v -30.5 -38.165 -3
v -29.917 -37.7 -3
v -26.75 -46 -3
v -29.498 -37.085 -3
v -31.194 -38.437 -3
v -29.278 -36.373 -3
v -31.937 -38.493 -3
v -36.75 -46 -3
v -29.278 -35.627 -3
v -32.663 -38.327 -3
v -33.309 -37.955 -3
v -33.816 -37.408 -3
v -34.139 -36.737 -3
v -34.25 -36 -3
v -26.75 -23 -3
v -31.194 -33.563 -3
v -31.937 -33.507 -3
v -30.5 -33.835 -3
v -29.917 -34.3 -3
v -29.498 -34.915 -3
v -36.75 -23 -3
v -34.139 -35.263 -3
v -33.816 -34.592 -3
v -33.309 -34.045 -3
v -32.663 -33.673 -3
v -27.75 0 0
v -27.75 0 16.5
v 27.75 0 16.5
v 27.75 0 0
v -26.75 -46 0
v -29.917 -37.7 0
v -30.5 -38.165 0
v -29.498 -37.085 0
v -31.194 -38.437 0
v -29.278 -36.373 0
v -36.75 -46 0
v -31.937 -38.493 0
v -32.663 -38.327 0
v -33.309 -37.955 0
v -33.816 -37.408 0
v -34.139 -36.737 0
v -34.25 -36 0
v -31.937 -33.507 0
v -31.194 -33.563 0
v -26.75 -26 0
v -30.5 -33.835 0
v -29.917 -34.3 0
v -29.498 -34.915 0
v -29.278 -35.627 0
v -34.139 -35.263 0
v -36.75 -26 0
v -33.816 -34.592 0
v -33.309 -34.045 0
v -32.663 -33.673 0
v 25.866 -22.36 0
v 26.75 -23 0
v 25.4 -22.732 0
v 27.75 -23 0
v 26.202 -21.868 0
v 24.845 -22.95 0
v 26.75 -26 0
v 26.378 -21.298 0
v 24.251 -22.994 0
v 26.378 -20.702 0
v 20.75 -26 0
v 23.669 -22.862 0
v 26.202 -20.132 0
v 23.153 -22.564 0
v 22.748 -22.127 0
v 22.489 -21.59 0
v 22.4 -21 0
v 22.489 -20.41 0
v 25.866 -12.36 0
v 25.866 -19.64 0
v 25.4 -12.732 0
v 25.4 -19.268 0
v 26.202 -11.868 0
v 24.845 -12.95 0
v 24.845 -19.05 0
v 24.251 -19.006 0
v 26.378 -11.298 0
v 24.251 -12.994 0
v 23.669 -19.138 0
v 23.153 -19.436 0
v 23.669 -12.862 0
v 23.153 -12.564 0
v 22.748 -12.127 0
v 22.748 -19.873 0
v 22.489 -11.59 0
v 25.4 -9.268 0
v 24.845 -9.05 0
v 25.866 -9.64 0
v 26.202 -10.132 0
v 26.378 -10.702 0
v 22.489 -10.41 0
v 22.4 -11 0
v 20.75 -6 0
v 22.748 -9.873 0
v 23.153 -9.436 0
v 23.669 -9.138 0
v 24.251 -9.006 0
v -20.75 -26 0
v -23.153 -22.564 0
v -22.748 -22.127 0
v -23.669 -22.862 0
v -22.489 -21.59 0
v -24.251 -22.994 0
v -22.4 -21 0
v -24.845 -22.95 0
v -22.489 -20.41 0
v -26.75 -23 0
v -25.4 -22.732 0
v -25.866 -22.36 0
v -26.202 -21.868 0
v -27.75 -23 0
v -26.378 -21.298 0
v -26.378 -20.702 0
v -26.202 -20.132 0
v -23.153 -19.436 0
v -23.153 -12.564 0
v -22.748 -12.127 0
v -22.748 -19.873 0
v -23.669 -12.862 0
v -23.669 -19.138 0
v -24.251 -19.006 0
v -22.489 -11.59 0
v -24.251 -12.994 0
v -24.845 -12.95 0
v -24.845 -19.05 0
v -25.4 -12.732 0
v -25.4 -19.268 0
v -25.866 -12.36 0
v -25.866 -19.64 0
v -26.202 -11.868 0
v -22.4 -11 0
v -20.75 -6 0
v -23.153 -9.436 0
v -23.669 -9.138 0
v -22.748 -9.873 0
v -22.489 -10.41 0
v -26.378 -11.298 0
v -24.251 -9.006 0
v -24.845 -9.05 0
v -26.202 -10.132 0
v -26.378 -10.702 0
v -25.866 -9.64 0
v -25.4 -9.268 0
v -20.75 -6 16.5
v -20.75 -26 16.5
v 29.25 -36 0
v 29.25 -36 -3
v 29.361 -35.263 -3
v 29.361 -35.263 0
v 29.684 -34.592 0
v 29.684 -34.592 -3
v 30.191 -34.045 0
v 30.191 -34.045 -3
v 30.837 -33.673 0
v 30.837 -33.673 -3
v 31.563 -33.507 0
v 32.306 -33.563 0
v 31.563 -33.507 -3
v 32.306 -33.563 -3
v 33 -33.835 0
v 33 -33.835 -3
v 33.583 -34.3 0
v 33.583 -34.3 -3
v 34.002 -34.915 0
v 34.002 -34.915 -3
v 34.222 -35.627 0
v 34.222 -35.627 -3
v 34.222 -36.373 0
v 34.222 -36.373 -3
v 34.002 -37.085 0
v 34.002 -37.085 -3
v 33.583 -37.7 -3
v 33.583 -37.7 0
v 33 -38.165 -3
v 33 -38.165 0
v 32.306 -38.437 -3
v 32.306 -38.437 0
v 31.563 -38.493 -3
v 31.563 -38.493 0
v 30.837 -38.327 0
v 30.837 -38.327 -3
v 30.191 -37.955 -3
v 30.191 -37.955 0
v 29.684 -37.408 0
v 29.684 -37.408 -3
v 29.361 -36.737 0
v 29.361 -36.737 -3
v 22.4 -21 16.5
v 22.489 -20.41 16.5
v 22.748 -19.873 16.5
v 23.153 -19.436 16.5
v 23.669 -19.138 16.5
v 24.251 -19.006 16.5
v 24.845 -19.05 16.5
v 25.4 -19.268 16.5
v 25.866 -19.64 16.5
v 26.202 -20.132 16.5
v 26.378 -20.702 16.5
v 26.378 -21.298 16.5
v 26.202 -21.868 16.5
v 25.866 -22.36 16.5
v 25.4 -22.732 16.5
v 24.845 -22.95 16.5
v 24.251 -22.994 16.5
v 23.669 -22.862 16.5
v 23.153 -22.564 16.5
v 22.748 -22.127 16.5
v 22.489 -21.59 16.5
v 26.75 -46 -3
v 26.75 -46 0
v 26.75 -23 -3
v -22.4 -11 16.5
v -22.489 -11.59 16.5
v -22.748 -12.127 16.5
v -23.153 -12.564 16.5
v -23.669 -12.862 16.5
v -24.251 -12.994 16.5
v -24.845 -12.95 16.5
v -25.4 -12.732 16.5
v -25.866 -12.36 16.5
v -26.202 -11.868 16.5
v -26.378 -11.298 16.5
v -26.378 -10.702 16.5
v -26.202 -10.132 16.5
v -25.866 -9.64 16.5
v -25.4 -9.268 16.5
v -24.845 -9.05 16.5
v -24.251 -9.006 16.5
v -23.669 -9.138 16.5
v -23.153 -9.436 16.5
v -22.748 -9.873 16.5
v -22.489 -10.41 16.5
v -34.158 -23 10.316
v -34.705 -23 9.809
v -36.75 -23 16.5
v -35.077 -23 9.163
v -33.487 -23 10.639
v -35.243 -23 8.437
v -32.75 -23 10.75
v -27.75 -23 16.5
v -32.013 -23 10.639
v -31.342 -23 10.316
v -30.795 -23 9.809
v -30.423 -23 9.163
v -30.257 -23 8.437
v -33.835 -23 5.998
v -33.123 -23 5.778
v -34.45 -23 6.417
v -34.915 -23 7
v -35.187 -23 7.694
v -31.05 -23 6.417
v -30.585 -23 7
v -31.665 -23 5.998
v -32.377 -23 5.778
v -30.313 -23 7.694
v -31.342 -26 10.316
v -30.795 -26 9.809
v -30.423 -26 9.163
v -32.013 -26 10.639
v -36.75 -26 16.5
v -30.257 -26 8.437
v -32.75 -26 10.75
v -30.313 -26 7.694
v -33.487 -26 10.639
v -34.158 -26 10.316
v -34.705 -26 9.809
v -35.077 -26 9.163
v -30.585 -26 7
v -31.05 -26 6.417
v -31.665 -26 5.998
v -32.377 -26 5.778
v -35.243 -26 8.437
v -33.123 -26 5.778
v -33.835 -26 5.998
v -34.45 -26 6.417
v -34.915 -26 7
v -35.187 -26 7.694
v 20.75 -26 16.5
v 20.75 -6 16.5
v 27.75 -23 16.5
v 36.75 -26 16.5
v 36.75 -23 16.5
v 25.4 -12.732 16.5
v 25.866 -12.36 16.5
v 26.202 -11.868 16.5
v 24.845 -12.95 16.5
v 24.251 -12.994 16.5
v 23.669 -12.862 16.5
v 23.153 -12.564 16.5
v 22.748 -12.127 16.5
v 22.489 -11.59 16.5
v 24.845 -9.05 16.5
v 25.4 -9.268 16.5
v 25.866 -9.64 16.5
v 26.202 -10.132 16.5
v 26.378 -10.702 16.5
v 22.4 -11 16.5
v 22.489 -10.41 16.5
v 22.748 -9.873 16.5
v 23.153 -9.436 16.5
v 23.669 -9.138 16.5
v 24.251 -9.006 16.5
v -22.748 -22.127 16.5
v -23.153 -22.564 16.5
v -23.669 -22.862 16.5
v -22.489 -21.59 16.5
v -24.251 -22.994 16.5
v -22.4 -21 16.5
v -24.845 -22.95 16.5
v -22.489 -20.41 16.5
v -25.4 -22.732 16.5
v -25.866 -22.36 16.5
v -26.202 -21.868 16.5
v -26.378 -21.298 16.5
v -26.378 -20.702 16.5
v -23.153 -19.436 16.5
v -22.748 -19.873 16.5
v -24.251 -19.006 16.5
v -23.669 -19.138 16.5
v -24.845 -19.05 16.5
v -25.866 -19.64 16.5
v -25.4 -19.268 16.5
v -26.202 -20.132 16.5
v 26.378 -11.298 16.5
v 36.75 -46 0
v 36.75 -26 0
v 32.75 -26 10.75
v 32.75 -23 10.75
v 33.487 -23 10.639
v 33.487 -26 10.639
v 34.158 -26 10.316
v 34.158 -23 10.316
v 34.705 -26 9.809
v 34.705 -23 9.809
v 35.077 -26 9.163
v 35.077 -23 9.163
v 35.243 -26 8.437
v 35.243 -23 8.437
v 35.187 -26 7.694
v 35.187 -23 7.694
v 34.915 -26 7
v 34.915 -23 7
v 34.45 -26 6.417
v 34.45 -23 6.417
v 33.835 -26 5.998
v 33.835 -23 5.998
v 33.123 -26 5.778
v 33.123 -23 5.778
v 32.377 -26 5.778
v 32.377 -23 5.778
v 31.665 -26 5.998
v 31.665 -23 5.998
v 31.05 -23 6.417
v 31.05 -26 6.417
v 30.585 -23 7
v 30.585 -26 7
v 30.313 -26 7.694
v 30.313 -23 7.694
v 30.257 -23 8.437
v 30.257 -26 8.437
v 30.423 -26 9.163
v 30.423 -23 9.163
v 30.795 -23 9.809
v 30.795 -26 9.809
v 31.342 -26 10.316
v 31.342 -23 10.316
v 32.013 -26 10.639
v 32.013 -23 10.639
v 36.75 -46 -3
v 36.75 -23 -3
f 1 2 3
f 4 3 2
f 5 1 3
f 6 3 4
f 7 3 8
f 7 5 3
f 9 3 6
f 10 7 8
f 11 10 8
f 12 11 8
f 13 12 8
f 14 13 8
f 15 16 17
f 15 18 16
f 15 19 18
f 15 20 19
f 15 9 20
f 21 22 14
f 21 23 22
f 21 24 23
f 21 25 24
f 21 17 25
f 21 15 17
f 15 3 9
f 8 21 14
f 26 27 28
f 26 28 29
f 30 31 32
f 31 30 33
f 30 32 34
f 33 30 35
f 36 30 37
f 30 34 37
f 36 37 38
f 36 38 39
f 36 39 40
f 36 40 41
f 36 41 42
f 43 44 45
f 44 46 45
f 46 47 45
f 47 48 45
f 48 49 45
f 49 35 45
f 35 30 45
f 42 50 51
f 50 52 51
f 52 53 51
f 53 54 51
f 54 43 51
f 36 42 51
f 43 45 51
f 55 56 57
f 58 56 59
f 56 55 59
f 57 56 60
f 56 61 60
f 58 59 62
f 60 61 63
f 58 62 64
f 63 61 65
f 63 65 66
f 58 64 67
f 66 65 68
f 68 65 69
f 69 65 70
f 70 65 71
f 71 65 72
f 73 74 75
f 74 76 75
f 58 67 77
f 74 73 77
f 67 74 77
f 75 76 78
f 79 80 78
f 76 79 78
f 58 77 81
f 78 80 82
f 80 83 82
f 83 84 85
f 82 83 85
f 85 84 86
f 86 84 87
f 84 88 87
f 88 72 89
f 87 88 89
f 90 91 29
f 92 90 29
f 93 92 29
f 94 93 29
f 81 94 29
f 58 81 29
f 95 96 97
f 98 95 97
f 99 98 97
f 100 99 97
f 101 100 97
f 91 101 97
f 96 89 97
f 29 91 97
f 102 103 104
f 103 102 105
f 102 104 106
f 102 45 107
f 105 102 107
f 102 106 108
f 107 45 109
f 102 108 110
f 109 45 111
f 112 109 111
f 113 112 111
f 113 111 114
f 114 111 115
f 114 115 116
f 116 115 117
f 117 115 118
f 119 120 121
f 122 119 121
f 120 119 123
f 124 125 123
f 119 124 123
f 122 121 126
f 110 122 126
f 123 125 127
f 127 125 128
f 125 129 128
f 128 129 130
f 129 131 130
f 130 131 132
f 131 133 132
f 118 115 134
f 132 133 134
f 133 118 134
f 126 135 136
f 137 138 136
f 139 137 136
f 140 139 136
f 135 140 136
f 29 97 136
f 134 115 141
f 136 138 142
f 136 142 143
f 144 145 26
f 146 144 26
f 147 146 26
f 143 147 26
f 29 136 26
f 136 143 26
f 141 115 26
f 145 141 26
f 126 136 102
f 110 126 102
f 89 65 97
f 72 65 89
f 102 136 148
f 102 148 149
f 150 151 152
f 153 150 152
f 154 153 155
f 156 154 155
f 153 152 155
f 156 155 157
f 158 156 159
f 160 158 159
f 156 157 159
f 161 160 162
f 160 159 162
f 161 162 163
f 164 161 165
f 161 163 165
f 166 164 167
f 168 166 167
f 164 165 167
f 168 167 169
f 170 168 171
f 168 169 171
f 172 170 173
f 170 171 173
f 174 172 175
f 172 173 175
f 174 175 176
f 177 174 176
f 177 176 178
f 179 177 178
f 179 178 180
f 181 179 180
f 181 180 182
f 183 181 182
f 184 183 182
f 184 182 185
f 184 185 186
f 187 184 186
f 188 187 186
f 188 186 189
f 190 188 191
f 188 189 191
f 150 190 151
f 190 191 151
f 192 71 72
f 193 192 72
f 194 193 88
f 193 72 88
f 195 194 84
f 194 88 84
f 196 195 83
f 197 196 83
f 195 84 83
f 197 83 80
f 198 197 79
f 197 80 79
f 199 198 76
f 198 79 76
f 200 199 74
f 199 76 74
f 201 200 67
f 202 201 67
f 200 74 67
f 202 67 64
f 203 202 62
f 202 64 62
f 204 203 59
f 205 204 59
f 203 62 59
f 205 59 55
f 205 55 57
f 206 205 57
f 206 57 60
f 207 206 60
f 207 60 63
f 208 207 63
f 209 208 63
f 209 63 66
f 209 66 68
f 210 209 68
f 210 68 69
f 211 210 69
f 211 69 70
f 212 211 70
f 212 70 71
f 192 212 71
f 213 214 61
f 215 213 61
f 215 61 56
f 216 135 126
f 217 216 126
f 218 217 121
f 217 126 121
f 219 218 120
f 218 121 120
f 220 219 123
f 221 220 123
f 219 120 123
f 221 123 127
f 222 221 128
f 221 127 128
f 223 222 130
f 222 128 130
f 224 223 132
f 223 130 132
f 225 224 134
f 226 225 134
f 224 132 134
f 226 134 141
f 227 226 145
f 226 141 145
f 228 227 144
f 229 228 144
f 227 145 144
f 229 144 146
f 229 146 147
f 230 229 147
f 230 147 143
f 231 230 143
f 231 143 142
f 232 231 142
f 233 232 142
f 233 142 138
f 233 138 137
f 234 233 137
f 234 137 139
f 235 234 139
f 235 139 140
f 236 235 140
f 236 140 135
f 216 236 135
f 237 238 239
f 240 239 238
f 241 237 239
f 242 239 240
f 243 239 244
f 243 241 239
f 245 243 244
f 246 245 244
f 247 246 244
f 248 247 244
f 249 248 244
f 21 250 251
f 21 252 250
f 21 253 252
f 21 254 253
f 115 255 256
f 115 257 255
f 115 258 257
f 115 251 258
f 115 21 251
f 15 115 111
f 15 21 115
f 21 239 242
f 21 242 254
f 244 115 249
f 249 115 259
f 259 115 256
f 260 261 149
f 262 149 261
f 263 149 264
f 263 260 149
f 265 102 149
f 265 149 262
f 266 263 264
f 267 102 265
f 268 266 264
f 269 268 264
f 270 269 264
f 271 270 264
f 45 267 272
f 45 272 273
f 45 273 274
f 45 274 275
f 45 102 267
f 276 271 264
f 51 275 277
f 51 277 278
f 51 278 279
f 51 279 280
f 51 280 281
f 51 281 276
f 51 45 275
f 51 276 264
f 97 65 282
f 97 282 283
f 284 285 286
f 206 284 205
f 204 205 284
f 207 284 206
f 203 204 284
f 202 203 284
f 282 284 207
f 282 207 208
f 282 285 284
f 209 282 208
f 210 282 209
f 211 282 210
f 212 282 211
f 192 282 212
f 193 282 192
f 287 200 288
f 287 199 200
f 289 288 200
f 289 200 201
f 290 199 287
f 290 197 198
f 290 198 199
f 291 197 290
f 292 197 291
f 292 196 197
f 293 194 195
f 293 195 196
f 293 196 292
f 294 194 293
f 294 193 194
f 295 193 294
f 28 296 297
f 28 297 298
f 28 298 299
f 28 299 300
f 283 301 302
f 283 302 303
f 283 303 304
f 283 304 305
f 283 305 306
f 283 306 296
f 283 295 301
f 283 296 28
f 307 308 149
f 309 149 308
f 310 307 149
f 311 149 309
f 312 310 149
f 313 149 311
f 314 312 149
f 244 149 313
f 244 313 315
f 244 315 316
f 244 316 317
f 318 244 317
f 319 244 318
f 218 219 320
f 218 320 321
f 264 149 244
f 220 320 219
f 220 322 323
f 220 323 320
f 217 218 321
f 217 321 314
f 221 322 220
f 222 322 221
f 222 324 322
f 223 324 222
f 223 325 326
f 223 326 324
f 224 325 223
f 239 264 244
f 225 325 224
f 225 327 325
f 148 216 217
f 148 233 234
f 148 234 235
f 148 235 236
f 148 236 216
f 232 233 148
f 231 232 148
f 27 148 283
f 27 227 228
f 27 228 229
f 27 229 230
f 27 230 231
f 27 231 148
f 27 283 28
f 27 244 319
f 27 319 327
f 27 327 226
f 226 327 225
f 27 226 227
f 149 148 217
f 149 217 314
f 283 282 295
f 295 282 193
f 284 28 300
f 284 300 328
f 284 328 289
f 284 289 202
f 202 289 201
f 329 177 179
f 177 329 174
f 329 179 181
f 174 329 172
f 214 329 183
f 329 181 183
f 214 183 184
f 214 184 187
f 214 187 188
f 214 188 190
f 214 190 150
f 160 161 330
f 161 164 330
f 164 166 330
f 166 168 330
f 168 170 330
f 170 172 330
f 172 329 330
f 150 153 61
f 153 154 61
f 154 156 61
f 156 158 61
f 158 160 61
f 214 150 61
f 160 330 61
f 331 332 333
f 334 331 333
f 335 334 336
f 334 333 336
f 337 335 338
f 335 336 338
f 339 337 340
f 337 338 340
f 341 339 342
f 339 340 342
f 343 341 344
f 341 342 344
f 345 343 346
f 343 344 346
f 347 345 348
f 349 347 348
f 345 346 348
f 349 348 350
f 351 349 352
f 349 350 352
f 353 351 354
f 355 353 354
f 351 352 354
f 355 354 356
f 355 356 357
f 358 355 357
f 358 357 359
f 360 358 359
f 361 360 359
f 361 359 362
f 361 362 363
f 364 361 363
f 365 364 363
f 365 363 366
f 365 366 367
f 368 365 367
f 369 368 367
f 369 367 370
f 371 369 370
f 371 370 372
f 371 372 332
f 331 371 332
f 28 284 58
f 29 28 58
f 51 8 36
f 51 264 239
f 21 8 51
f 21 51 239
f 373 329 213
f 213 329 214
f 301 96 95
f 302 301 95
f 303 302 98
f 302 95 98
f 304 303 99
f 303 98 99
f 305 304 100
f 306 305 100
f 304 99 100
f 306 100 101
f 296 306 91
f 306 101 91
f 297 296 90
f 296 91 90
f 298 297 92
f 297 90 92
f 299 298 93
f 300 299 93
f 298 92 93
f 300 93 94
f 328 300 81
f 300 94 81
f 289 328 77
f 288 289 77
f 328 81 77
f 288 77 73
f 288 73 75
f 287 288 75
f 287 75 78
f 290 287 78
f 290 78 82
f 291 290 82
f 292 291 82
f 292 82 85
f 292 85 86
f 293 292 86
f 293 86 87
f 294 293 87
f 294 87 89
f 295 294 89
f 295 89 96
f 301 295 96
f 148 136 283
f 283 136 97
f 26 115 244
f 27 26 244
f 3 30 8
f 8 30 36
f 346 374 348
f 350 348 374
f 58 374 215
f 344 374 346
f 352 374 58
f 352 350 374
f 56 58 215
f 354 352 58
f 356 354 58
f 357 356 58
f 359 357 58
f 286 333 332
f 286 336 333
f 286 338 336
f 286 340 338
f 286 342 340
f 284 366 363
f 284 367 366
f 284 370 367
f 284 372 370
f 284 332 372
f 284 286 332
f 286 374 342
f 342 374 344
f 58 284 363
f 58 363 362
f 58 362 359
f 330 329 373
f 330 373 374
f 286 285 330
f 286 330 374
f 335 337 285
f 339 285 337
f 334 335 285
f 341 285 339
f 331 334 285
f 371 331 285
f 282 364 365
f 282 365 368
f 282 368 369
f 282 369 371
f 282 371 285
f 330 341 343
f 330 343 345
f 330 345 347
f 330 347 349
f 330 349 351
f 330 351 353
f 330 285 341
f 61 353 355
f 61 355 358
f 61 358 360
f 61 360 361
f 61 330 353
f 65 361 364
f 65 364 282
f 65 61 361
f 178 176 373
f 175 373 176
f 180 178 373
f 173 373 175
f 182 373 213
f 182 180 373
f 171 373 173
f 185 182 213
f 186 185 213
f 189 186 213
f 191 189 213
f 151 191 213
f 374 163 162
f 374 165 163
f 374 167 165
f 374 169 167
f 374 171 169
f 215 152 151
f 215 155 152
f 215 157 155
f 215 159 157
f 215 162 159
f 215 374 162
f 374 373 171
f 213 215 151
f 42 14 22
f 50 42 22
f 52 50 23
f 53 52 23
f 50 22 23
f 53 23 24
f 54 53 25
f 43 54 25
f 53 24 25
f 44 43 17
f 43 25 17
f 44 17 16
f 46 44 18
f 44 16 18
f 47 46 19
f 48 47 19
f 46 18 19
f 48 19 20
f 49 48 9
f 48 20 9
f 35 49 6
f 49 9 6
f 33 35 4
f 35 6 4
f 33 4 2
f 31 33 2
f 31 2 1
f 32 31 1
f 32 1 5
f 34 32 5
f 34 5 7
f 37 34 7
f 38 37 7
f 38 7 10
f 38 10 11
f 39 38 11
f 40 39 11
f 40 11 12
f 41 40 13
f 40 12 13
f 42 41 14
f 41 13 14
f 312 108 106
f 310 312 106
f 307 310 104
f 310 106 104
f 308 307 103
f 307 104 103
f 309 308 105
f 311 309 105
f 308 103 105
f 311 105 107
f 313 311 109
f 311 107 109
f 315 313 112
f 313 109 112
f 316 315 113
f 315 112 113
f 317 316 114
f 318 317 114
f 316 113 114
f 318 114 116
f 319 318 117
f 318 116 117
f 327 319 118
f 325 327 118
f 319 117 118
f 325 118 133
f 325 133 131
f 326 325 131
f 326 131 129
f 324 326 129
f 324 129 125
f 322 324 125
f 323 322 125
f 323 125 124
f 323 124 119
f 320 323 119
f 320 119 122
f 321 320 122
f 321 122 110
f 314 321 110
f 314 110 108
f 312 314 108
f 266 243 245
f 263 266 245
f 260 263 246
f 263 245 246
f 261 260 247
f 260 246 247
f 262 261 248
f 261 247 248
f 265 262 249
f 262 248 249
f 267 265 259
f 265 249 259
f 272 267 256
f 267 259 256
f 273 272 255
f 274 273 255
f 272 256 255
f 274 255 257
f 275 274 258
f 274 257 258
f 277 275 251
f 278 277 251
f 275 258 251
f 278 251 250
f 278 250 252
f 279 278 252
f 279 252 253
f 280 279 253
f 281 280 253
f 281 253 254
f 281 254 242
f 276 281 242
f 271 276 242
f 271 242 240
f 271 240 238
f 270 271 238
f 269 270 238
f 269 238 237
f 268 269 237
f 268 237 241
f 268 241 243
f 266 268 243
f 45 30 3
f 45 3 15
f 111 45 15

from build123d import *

# Parameters (mm, degrees)
EXTRUDE_1_DEPTH     = 16.5
SKETCH_2_R          = 2.5
CUT_EXTRUDE_1_DEPTH = 16.5
SKETCH_3_W          = 10
SKETCH_3_H          = 16.5
CUT_EXTRUDE_2_DEPTH = 3
SKETCH_5_R          = 2
CUT_EXTRUDE_4_DEPTH = 48.945933091
SKETCH_6_W          = 10
SKETCH_6_H          = 23
EXTRUDE_2_DEPTH     = 3
SKETCH_7_R          = 2.5
CUT_EXTRUDE_5_DEPTH = 3
SKETCH2_W           = 16.5
SKETCH2_H           = 23
BOSS_EXTRUDE1_DEPTH = 1
SKETCH3_W           = 16.5
SKETCH3_H           = 23
BOSS_EXTRUDE2_DEPTH = 1


with BuildPart() as part:
    # 草图1 → 凸台-拉伸1 (new body)
    with BuildSketch(Plane.XY):
        Polygon((0, 0), (26.75, 0), (26.75, -20), (36.75, -20), (36.75, -26), (20.75, -26), (20.75, -6), (0, -6), (-20.75, -6), (-20.75, -26), (-36.75, -26), (-36.75, -20), (-26.75, -20), (-26.75, 0), align=None)
    extrude(amount=EXTRUDE_1_DEPTH)

    # 草图2 → 切除-拉伸1 (cut)
    with BuildSketch(Plane(origin=(0, -20, 0), x_dir=(1, 0, 0), z_dir=(0, 1, 0))):
        with Locations(Location((32.75, -8.25, 0), (0, 0, 270))):
            Circle(SKETCH_2_R)
        with Locations(Location((-32.75, -8.25, 0), (0, 0, 270))):
            Circle(SKETCH_2_R)
    extrude(amount=-CUT_EXTRUDE_1_DEPTH, mode=Mode.SUBTRACT)

    # 草图3 → 切除-拉伸2 (cut)
    with BuildSketch(Plane(origin=(0, -20, 0), x_dir=(1, 0, 0), z_dir=(0, 1, 0))):
        with Locations((31.75, -8.25)):
            Rectangle(SKETCH_3_W, SKETCH_3_H)
        with Locations((-31.75, -8.25)):
            Rectangle(SKETCH_3_W, SKETCH_3_H)
    extrude(amount=-CUT_EXTRUDE_2_DEPTH, mode=Mode.SUBTRACT)

    # 草图5 → 切除-拉伸4 (cut, through all)
    with BuildSketch(Plane(origin=(0, 0, 0), x_dir=(-1, 0, 0), z_dir=(0, 0, -1))):
        with Locations((-24.4, -11)):
            Circle(SKETCH_5_R)
        with Locations((-24.4, -21)):
            Circle(SKETCH_5_R)
        with Locations(Location((24.4, -21, 0), (0, 0, 180))):
            Circle(SKETCH_5_R)
        with Locations(Location((24.4, -11, 0), (0, 0, 180))):
            Circle(SKETCH_5_R)
    extrude(amount=-CUT_EXTRUDE_4_DEPTH, mode=Mode.SUBTRACT)

    # 草图6 → 凸台-拉伸2 (add)
    with BuildSketch(Plane(origin=(0, 0, 0), x_dir=(-1, 0, 0), z_dir=(0, 0, -1))):
        with Locations((-31.75, -34.5)):
            Rectangle(SKETCH_6_W, SKETCH_6_H)
        with Locations((31.75, -34.5)):
            Rectangle(SKETCH_6_W, SKETCH_6_H)
    extrude(amount=EXTRUDE_2_DEPTH)

    # 草图7 → 切除-拉伸5 (cut)
    with BuildSketch(Plane(origin=(0, 0, -3), x_dir=(-1, 0, 0), z_dir=(0, 0, -1))):
        with Locations((-31.75, -36)):
            Circle(SKETCH_7_R)
        with Locations((31.75, -36)):
            Circle(SKETCH_7_R)
    extrude(amount=-CUT_EXTRUDE_5_DEPTH, mode=Mode.SUBTRACT)

    # Sketch2 → Boss-Extrude1 (add)
    with BuildSketch(Plane.ZY.offset(26.75)):
        with Locations((8.25, -11.5)):
            Rectangle(SKETCH2_W, SKETCH2_H)
    extrude(amount=BOSS_EXTRUDE1_DEPTH)

    # Sketch3 → Boss-Extrude2 (add)
    with BuildSketch(Plane(origin=(26.75, 0, 0), x_dir=(0, 0, -1), z_dir=(1, 0, 0))):
        with Locations((-8.25, -11.5)):
            Rectangle(SKETCH3_W, SKETCH3_H)
    extrude(amount=BOSS_EXTRUDE2_DEPTH)


solid = part.part
